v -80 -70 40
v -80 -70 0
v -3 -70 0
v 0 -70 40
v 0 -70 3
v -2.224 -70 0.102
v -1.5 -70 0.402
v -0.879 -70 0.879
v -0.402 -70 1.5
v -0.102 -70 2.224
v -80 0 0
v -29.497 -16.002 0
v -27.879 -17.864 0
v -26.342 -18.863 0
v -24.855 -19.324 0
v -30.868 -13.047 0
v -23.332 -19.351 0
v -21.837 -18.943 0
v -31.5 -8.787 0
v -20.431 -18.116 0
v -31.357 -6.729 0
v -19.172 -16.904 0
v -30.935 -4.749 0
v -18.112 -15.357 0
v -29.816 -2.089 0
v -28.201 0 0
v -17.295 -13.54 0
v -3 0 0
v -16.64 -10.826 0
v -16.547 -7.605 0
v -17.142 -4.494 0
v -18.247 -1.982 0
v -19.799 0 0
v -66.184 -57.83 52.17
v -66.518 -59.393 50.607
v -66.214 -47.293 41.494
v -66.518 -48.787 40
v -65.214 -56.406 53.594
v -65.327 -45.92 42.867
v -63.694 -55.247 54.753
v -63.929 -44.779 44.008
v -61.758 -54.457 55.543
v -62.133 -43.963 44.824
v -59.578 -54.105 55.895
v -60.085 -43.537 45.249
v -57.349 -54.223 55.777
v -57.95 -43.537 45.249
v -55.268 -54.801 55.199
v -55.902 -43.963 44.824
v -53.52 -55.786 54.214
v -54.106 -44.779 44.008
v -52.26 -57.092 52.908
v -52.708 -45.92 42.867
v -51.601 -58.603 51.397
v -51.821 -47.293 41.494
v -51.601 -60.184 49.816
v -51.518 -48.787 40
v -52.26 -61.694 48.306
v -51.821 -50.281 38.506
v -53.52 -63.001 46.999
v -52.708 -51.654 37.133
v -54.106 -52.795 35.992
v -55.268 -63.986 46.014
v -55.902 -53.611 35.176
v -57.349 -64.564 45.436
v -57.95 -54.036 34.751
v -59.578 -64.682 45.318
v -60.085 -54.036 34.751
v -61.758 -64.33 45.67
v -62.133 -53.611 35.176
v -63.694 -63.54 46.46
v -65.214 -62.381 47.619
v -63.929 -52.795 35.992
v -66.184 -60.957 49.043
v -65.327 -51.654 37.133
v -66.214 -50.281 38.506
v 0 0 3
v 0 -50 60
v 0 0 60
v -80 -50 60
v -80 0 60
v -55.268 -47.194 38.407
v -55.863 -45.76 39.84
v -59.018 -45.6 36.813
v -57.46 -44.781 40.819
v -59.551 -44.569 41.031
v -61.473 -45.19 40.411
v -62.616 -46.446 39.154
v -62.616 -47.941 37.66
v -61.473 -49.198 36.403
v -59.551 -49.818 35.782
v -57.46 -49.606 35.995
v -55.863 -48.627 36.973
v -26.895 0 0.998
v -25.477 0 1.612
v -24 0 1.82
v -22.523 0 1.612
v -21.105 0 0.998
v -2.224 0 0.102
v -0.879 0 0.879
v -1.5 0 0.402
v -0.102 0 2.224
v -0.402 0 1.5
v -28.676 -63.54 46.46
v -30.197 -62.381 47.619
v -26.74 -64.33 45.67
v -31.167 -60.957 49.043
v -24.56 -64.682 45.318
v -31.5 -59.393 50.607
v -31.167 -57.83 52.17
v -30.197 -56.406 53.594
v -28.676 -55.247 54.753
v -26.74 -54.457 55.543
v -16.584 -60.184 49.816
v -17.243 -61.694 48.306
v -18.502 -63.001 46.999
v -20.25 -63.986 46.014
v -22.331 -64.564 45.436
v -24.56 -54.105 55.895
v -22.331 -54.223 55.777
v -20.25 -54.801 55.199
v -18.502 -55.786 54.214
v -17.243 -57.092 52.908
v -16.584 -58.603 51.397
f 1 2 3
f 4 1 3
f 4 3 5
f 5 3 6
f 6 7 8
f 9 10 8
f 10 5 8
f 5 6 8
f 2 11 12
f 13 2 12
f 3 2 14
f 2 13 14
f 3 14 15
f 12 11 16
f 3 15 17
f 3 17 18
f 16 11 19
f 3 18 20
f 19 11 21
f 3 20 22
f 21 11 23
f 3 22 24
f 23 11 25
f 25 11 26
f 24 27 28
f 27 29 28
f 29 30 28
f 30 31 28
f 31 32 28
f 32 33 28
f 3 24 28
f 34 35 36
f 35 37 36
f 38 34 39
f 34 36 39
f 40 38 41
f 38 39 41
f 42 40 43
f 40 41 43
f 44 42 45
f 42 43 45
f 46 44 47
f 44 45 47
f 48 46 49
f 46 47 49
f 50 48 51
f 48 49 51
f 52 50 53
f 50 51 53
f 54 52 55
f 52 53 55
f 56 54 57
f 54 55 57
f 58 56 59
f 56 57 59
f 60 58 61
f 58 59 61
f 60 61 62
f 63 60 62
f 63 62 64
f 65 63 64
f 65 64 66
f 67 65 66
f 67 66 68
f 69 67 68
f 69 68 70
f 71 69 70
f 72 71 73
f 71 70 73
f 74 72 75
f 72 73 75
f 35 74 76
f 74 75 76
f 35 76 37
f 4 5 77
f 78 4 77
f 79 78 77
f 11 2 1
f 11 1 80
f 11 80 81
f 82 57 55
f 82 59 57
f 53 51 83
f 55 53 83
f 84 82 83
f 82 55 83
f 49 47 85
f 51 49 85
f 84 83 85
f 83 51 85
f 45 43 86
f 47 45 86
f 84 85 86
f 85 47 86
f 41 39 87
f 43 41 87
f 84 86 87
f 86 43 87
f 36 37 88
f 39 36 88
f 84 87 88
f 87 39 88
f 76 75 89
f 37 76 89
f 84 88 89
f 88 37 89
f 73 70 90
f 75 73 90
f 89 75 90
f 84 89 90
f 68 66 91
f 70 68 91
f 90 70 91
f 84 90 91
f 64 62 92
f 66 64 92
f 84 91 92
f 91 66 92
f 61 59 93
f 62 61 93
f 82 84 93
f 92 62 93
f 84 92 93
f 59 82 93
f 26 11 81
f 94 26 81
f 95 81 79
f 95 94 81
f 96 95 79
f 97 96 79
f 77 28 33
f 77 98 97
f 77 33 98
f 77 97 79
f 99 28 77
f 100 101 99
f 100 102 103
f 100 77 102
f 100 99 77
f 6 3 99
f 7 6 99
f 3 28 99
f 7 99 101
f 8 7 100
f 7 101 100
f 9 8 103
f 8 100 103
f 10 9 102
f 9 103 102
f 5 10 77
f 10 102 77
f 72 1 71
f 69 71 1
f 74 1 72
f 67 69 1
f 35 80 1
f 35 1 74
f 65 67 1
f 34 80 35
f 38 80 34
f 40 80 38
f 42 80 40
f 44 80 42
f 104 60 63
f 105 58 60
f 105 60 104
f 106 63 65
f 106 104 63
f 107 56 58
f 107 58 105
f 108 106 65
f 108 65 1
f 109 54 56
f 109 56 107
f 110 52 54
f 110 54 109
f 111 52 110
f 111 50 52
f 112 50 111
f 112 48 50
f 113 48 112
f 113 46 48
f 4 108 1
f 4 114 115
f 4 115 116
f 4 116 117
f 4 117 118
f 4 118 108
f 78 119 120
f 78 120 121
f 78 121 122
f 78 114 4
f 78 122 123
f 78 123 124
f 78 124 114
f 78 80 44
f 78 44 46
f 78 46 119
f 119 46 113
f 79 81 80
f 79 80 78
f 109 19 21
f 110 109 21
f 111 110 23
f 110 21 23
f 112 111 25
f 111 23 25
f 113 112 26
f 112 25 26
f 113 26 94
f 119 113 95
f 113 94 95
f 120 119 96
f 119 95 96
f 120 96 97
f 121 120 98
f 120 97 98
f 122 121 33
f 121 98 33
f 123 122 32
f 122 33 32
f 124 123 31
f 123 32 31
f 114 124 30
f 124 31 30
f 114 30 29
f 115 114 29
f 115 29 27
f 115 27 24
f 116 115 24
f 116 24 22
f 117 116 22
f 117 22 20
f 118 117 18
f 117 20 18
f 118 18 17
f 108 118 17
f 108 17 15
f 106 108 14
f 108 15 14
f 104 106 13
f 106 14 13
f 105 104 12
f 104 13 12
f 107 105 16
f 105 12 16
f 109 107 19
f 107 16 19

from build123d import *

# Parameters (mm, degrees)
F0_W     = 80
F0_H     = 70
F1_DEPTH = 60
F2_SIZE  = 20
F4_D     = 15
F6_D     = 15
F6_DEPTH = 15
F6_TIP   = 4.5064546427
F7_R     = 3


with BuildPart() as f1:
    # F0 (on Top) → F1 (new body)
    with BuildSketch(Plane.XY):
        with Locations((-40, -35)):
            Rectangle(F0_W, F0_H)
    extrude(amount=F1_DEPTH)

    # F2
    f2_edges = [f1.edges().sort_by_distance(p)[0] for p in [
        (-40, -70, 60),
    ]]
    chamfer(f2_edges, length=F2_SIZE)

    # F4 (through all)
    with Locations(Plane(origin=(0, -55, 55), x_dir=(1, 0, 0), z_dir=(0, -0.7071067812, 0.7071067812))):
        with Locations((-24, -6.2132034356)):
            Hole(F4_D / 2)

    # F6
    with Locations(Plane(origin=(0, -55, 55), x_dir=(1, 0, 0), z_dir=(0, -0.7071067812, 0.7071067812))):
        with Locations((-59.0175294898, -6.2132034356)):
            Hole(F6_D / 2, depth=F6_DEPTH)
            with Locations((0, 0, -(F6_DEPTH + F6_TIP / 2))):  # 118° drill point
                Cone(0, F6_D / 2, F6_TIP, mode=Mode.SUBTRACT)

    # F7
    f7_edges = [f1.edges().sort_by_distance(p)[0] for p in [
        (0, -35, 0),
    ]]
    fillet(f7_edges, radius=F7_R)


solid = f1.part
